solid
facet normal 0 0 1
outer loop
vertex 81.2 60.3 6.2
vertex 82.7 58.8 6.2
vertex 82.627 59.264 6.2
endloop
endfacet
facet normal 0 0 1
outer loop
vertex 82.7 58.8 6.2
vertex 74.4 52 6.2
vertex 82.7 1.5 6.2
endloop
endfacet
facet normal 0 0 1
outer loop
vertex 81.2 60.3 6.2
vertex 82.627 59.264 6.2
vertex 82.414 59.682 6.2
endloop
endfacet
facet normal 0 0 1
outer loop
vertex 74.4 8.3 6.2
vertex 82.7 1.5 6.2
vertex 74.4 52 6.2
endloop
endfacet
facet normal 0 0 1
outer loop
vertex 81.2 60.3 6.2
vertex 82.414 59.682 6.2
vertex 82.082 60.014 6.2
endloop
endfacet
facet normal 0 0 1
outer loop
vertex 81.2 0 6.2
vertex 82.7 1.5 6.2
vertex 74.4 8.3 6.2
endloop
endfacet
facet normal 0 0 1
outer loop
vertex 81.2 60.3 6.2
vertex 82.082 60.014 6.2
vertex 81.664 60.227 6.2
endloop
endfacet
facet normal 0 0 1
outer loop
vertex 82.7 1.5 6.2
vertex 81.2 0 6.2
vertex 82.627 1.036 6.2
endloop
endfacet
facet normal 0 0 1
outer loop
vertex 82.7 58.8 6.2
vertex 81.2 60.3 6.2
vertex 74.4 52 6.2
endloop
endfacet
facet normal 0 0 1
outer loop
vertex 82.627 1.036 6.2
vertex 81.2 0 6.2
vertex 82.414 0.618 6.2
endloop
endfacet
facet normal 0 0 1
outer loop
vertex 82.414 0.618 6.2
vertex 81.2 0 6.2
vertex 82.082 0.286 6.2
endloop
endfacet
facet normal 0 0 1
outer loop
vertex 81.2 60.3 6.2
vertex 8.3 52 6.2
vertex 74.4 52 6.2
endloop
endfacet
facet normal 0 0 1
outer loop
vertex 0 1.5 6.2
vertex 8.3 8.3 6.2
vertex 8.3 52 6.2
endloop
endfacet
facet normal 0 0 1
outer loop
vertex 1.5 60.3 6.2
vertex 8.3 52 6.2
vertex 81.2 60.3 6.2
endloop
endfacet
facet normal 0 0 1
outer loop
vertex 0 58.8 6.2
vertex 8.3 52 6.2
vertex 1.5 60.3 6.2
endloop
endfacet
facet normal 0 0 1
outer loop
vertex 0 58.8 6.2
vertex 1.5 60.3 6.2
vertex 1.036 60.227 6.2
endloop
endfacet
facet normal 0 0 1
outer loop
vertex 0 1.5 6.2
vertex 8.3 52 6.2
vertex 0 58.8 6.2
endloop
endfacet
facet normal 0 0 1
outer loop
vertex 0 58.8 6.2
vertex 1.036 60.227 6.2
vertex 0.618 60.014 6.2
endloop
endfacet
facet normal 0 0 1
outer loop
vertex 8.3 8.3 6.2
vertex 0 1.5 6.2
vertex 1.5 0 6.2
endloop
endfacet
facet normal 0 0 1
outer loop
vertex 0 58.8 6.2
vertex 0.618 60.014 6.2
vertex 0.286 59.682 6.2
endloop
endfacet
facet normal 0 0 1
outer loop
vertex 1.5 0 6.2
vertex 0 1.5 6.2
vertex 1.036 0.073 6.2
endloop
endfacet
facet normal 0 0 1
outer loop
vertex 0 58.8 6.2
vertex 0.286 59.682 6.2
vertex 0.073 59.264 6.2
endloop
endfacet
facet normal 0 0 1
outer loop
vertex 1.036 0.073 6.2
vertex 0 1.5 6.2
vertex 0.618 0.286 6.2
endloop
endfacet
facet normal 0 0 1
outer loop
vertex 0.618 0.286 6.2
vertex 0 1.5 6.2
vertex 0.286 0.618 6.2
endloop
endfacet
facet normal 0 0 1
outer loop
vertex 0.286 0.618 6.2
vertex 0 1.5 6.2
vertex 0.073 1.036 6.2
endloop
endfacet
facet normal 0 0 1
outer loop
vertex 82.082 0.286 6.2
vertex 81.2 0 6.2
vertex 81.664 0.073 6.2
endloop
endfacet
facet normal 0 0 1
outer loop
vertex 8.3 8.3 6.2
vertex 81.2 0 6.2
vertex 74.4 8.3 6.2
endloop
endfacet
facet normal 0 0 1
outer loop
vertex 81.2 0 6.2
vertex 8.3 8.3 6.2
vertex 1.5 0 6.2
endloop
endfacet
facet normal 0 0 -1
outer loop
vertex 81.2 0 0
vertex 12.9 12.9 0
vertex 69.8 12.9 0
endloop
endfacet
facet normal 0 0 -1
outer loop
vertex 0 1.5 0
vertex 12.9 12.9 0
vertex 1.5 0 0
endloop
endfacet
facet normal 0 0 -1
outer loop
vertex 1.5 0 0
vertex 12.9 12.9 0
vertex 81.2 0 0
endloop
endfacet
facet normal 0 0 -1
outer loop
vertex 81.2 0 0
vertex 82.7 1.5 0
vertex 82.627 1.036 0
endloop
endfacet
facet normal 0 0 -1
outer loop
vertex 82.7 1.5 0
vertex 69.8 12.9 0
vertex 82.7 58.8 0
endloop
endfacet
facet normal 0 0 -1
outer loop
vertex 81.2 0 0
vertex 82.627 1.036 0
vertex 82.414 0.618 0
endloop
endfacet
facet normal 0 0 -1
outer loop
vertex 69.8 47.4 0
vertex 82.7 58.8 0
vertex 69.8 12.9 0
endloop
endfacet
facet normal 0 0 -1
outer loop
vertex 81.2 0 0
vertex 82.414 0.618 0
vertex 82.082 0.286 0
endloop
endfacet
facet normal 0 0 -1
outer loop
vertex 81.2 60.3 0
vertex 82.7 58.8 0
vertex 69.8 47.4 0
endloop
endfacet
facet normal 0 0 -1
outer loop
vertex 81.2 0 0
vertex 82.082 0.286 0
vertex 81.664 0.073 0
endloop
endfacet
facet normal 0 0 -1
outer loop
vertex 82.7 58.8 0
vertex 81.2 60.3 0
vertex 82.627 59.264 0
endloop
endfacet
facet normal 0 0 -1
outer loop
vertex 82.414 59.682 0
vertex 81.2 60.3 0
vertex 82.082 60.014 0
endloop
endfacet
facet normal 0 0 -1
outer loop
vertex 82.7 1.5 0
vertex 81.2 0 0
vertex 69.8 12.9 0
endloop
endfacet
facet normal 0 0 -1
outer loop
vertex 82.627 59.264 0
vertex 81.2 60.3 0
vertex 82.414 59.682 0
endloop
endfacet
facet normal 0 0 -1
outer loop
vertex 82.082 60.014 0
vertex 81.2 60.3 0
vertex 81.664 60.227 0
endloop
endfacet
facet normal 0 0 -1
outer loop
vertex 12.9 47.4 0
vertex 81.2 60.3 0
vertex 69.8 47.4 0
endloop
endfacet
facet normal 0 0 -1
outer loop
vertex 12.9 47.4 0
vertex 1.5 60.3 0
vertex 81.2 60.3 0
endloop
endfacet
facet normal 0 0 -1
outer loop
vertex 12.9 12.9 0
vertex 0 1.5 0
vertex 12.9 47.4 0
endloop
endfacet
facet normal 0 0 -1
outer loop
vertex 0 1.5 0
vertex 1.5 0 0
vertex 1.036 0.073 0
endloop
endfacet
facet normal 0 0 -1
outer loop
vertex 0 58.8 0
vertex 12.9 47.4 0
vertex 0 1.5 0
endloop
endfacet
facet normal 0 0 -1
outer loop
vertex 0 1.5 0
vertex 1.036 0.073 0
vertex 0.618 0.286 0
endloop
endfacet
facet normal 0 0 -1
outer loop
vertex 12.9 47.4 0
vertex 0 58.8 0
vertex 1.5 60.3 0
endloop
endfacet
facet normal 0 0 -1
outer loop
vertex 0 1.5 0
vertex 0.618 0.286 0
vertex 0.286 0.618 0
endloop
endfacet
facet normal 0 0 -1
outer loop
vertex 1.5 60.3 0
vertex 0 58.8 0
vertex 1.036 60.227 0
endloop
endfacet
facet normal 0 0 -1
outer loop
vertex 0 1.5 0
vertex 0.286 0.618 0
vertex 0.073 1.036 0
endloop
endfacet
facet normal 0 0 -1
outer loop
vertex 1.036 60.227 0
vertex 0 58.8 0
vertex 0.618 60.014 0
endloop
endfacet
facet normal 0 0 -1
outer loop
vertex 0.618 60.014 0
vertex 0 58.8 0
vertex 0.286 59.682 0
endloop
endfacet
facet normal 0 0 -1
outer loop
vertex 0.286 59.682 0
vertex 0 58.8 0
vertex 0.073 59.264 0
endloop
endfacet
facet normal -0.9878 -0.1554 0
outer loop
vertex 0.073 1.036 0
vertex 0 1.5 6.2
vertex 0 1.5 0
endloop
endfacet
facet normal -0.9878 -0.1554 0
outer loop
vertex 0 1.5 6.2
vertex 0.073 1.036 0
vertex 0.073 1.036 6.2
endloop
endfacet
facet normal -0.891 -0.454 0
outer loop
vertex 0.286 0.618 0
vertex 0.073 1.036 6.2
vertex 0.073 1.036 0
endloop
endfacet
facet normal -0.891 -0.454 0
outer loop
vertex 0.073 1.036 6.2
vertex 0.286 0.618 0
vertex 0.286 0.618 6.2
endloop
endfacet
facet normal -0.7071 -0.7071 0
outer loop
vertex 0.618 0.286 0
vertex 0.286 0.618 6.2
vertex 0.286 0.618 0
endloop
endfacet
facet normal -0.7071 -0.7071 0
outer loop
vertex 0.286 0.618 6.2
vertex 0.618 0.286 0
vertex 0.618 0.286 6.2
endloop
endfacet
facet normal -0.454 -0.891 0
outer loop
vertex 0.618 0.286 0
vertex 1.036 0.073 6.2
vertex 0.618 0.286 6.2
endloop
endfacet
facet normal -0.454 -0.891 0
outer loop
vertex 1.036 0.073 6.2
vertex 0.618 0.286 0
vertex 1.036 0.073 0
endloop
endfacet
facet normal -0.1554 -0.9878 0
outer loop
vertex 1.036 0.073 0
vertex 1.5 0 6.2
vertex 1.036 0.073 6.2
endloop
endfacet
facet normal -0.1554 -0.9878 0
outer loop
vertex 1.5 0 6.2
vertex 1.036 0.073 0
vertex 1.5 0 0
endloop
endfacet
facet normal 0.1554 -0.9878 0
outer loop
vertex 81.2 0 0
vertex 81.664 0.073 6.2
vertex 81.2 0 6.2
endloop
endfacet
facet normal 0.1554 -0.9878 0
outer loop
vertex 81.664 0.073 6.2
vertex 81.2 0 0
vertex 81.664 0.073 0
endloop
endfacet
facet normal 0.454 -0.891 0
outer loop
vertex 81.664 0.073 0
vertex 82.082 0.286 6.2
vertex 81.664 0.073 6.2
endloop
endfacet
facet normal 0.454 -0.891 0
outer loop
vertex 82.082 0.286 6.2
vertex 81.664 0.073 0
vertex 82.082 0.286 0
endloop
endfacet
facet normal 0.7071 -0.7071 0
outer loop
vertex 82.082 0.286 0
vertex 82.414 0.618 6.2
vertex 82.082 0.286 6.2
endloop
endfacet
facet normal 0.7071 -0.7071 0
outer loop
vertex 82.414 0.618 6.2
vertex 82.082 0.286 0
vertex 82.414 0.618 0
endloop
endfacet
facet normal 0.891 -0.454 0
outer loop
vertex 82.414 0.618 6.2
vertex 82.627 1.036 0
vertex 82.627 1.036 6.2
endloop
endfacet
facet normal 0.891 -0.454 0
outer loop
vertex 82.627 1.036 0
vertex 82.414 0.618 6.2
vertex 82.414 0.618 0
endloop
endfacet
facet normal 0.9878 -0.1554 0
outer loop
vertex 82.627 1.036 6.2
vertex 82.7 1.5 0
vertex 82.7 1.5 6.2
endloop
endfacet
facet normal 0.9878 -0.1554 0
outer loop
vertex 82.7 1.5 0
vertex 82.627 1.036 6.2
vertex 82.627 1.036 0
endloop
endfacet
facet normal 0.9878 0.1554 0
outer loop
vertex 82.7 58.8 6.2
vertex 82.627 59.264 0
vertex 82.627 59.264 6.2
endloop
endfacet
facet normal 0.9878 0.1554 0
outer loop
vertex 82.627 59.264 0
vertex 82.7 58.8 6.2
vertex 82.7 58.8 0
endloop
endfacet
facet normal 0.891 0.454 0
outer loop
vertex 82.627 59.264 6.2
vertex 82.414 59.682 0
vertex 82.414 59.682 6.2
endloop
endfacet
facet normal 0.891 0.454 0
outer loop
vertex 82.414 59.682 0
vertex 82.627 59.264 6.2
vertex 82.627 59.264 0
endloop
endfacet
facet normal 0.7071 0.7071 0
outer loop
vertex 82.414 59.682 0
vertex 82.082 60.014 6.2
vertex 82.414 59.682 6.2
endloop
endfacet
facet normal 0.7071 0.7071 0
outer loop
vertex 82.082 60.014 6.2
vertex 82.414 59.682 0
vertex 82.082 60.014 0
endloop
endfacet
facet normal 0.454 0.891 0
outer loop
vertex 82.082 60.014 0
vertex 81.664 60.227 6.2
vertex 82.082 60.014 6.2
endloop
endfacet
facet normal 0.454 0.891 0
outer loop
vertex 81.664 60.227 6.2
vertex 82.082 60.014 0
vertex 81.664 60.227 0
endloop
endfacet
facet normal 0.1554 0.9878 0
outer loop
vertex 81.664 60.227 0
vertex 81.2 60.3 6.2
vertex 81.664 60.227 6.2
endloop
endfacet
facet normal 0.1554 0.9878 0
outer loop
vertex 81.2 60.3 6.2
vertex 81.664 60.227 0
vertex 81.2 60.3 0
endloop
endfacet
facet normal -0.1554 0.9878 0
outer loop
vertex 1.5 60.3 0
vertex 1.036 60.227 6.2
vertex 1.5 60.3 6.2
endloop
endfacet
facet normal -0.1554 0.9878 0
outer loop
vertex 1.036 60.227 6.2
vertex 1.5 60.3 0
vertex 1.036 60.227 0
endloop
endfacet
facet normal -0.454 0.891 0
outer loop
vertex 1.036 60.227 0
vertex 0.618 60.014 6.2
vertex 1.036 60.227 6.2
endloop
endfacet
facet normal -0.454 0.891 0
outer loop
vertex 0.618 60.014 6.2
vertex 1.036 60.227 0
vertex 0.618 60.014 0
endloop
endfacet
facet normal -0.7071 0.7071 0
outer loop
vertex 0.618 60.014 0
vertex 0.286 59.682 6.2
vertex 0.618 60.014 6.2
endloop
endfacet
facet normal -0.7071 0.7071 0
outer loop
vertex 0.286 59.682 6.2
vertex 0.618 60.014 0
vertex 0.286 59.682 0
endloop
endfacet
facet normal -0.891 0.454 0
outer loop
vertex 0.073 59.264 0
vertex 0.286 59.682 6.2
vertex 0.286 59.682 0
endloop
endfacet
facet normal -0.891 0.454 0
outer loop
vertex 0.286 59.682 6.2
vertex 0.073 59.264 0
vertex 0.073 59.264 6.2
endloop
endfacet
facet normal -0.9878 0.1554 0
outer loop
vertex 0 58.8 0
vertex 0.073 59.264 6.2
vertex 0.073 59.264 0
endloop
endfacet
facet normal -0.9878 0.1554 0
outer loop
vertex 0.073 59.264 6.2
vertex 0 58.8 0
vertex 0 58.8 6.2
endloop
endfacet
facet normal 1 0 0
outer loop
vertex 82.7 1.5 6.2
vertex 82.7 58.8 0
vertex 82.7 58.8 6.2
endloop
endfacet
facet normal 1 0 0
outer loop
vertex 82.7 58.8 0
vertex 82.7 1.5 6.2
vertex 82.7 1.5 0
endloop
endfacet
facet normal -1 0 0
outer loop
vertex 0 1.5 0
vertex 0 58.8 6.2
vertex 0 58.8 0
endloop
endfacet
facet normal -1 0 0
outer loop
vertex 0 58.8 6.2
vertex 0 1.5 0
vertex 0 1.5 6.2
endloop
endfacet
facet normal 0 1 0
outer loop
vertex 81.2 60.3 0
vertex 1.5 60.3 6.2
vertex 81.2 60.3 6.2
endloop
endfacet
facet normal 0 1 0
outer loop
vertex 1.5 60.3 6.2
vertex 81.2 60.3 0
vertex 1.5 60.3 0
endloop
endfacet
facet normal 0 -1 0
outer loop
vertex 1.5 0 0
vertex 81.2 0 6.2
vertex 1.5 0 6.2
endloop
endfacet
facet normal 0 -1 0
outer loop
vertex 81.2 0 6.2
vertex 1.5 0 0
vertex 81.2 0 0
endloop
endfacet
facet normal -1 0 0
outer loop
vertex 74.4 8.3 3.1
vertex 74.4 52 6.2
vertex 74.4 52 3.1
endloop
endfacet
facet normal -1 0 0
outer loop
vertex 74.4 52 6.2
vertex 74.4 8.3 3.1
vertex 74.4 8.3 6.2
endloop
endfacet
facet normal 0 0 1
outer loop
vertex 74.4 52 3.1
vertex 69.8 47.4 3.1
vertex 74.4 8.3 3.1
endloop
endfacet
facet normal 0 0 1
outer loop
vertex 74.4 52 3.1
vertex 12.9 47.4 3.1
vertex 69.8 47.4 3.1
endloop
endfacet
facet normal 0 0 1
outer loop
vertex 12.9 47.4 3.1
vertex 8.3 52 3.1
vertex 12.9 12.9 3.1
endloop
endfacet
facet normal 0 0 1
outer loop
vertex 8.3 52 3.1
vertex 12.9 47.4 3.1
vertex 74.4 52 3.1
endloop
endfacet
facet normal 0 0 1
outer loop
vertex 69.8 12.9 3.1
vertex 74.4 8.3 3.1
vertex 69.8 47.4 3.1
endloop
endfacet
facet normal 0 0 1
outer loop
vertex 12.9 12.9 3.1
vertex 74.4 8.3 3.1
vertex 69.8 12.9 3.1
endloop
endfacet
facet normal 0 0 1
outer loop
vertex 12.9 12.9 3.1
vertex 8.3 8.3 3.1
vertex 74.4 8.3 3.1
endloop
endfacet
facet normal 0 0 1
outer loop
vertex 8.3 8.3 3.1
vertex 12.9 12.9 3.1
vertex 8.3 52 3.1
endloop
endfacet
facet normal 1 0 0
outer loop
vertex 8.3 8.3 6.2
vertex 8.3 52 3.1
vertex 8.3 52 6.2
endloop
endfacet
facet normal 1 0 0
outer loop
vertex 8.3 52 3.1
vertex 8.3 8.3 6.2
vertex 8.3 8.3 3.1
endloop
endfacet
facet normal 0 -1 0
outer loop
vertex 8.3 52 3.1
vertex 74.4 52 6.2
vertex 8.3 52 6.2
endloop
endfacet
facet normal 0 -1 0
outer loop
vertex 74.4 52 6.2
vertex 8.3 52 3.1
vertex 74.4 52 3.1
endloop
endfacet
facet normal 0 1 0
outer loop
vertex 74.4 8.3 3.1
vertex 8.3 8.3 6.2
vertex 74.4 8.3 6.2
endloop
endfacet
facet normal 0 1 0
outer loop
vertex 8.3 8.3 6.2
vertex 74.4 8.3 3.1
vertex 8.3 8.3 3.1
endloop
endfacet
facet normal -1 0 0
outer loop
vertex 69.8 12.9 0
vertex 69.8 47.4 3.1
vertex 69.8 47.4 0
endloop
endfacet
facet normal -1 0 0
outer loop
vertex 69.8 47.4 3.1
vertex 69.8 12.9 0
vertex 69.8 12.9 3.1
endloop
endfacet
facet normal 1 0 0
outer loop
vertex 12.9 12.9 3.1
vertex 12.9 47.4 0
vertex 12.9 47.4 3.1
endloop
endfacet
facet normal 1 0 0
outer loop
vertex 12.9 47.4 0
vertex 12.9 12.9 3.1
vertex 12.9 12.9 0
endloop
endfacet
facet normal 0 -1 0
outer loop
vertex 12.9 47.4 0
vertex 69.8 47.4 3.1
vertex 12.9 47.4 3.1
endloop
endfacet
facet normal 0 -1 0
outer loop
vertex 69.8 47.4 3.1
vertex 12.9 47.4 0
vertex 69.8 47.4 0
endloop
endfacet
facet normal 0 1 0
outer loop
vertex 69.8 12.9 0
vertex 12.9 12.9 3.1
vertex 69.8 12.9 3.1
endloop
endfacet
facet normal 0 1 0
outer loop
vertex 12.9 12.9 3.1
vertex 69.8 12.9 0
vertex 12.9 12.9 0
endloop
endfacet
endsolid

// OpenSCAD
// file: simple_rounded_cube.scad
module sr_cube(size=[1,1,1],radius=0.5,corners=[1,1,1,1]) {
    difference(){    
    cube(size);
    
        if(corners[0])
        translate([radius,radius,0])rotate([0,0,180])difference(){
                cube([radius*2,radius*2,size[2]]);
                cylinder(size[2],radius,radius);
        }
        if(corners[1])
        translate([size[0]-radius,radius,0])rotate([0,0,270])difference(){
                cube([radius*2,radius*2,size[2]]);
                cylinder(size[2],radius,radius);
        }
        if(corners[2])
        translate([size[0]-radius,size[1]-radius,0])rotate([0,0,0])difference(){
                cube([radius*2,radius*2,size[2]]);
                cylinder(size[2],radius,radius);
        }
        if(corners[3])
        translate([radius,size[1]-radius,0])rotate([0,0,90])difference(){
                cube([radius*2,radius*2,size[2]]);
                cylinder(size[2],radius,radius);
        }
        }
        
}


//sr_cube([20,20,5], radius=4,corners=[0,0,0,0]);
// main file
include <simple_rounded_cube.scad>

$fn = 20;

//printer imprecision (critical parts are printed bigger/smaller by this variable)
eps = 0.3;


//outer width
ow = 65.5;
//outer length
ol = 43.1;
//outer height
oh = 3.1;

//frame width
fw = 4.3;

//cover width
cw = fw * 2;
//cover height
ch = oh;

difference(){
sr_cube([ow+cw*2,ol+cw*2,oh+ch],radius=1.5);

translate([cw-eps,cw-eps,ch]) cube([ow+eps*2,ol+eps*2,oh]);
translate([cw+fw,cw+fw,0]) cube([ow-2*fw,ol-2*fw,oh+ch]);

}
